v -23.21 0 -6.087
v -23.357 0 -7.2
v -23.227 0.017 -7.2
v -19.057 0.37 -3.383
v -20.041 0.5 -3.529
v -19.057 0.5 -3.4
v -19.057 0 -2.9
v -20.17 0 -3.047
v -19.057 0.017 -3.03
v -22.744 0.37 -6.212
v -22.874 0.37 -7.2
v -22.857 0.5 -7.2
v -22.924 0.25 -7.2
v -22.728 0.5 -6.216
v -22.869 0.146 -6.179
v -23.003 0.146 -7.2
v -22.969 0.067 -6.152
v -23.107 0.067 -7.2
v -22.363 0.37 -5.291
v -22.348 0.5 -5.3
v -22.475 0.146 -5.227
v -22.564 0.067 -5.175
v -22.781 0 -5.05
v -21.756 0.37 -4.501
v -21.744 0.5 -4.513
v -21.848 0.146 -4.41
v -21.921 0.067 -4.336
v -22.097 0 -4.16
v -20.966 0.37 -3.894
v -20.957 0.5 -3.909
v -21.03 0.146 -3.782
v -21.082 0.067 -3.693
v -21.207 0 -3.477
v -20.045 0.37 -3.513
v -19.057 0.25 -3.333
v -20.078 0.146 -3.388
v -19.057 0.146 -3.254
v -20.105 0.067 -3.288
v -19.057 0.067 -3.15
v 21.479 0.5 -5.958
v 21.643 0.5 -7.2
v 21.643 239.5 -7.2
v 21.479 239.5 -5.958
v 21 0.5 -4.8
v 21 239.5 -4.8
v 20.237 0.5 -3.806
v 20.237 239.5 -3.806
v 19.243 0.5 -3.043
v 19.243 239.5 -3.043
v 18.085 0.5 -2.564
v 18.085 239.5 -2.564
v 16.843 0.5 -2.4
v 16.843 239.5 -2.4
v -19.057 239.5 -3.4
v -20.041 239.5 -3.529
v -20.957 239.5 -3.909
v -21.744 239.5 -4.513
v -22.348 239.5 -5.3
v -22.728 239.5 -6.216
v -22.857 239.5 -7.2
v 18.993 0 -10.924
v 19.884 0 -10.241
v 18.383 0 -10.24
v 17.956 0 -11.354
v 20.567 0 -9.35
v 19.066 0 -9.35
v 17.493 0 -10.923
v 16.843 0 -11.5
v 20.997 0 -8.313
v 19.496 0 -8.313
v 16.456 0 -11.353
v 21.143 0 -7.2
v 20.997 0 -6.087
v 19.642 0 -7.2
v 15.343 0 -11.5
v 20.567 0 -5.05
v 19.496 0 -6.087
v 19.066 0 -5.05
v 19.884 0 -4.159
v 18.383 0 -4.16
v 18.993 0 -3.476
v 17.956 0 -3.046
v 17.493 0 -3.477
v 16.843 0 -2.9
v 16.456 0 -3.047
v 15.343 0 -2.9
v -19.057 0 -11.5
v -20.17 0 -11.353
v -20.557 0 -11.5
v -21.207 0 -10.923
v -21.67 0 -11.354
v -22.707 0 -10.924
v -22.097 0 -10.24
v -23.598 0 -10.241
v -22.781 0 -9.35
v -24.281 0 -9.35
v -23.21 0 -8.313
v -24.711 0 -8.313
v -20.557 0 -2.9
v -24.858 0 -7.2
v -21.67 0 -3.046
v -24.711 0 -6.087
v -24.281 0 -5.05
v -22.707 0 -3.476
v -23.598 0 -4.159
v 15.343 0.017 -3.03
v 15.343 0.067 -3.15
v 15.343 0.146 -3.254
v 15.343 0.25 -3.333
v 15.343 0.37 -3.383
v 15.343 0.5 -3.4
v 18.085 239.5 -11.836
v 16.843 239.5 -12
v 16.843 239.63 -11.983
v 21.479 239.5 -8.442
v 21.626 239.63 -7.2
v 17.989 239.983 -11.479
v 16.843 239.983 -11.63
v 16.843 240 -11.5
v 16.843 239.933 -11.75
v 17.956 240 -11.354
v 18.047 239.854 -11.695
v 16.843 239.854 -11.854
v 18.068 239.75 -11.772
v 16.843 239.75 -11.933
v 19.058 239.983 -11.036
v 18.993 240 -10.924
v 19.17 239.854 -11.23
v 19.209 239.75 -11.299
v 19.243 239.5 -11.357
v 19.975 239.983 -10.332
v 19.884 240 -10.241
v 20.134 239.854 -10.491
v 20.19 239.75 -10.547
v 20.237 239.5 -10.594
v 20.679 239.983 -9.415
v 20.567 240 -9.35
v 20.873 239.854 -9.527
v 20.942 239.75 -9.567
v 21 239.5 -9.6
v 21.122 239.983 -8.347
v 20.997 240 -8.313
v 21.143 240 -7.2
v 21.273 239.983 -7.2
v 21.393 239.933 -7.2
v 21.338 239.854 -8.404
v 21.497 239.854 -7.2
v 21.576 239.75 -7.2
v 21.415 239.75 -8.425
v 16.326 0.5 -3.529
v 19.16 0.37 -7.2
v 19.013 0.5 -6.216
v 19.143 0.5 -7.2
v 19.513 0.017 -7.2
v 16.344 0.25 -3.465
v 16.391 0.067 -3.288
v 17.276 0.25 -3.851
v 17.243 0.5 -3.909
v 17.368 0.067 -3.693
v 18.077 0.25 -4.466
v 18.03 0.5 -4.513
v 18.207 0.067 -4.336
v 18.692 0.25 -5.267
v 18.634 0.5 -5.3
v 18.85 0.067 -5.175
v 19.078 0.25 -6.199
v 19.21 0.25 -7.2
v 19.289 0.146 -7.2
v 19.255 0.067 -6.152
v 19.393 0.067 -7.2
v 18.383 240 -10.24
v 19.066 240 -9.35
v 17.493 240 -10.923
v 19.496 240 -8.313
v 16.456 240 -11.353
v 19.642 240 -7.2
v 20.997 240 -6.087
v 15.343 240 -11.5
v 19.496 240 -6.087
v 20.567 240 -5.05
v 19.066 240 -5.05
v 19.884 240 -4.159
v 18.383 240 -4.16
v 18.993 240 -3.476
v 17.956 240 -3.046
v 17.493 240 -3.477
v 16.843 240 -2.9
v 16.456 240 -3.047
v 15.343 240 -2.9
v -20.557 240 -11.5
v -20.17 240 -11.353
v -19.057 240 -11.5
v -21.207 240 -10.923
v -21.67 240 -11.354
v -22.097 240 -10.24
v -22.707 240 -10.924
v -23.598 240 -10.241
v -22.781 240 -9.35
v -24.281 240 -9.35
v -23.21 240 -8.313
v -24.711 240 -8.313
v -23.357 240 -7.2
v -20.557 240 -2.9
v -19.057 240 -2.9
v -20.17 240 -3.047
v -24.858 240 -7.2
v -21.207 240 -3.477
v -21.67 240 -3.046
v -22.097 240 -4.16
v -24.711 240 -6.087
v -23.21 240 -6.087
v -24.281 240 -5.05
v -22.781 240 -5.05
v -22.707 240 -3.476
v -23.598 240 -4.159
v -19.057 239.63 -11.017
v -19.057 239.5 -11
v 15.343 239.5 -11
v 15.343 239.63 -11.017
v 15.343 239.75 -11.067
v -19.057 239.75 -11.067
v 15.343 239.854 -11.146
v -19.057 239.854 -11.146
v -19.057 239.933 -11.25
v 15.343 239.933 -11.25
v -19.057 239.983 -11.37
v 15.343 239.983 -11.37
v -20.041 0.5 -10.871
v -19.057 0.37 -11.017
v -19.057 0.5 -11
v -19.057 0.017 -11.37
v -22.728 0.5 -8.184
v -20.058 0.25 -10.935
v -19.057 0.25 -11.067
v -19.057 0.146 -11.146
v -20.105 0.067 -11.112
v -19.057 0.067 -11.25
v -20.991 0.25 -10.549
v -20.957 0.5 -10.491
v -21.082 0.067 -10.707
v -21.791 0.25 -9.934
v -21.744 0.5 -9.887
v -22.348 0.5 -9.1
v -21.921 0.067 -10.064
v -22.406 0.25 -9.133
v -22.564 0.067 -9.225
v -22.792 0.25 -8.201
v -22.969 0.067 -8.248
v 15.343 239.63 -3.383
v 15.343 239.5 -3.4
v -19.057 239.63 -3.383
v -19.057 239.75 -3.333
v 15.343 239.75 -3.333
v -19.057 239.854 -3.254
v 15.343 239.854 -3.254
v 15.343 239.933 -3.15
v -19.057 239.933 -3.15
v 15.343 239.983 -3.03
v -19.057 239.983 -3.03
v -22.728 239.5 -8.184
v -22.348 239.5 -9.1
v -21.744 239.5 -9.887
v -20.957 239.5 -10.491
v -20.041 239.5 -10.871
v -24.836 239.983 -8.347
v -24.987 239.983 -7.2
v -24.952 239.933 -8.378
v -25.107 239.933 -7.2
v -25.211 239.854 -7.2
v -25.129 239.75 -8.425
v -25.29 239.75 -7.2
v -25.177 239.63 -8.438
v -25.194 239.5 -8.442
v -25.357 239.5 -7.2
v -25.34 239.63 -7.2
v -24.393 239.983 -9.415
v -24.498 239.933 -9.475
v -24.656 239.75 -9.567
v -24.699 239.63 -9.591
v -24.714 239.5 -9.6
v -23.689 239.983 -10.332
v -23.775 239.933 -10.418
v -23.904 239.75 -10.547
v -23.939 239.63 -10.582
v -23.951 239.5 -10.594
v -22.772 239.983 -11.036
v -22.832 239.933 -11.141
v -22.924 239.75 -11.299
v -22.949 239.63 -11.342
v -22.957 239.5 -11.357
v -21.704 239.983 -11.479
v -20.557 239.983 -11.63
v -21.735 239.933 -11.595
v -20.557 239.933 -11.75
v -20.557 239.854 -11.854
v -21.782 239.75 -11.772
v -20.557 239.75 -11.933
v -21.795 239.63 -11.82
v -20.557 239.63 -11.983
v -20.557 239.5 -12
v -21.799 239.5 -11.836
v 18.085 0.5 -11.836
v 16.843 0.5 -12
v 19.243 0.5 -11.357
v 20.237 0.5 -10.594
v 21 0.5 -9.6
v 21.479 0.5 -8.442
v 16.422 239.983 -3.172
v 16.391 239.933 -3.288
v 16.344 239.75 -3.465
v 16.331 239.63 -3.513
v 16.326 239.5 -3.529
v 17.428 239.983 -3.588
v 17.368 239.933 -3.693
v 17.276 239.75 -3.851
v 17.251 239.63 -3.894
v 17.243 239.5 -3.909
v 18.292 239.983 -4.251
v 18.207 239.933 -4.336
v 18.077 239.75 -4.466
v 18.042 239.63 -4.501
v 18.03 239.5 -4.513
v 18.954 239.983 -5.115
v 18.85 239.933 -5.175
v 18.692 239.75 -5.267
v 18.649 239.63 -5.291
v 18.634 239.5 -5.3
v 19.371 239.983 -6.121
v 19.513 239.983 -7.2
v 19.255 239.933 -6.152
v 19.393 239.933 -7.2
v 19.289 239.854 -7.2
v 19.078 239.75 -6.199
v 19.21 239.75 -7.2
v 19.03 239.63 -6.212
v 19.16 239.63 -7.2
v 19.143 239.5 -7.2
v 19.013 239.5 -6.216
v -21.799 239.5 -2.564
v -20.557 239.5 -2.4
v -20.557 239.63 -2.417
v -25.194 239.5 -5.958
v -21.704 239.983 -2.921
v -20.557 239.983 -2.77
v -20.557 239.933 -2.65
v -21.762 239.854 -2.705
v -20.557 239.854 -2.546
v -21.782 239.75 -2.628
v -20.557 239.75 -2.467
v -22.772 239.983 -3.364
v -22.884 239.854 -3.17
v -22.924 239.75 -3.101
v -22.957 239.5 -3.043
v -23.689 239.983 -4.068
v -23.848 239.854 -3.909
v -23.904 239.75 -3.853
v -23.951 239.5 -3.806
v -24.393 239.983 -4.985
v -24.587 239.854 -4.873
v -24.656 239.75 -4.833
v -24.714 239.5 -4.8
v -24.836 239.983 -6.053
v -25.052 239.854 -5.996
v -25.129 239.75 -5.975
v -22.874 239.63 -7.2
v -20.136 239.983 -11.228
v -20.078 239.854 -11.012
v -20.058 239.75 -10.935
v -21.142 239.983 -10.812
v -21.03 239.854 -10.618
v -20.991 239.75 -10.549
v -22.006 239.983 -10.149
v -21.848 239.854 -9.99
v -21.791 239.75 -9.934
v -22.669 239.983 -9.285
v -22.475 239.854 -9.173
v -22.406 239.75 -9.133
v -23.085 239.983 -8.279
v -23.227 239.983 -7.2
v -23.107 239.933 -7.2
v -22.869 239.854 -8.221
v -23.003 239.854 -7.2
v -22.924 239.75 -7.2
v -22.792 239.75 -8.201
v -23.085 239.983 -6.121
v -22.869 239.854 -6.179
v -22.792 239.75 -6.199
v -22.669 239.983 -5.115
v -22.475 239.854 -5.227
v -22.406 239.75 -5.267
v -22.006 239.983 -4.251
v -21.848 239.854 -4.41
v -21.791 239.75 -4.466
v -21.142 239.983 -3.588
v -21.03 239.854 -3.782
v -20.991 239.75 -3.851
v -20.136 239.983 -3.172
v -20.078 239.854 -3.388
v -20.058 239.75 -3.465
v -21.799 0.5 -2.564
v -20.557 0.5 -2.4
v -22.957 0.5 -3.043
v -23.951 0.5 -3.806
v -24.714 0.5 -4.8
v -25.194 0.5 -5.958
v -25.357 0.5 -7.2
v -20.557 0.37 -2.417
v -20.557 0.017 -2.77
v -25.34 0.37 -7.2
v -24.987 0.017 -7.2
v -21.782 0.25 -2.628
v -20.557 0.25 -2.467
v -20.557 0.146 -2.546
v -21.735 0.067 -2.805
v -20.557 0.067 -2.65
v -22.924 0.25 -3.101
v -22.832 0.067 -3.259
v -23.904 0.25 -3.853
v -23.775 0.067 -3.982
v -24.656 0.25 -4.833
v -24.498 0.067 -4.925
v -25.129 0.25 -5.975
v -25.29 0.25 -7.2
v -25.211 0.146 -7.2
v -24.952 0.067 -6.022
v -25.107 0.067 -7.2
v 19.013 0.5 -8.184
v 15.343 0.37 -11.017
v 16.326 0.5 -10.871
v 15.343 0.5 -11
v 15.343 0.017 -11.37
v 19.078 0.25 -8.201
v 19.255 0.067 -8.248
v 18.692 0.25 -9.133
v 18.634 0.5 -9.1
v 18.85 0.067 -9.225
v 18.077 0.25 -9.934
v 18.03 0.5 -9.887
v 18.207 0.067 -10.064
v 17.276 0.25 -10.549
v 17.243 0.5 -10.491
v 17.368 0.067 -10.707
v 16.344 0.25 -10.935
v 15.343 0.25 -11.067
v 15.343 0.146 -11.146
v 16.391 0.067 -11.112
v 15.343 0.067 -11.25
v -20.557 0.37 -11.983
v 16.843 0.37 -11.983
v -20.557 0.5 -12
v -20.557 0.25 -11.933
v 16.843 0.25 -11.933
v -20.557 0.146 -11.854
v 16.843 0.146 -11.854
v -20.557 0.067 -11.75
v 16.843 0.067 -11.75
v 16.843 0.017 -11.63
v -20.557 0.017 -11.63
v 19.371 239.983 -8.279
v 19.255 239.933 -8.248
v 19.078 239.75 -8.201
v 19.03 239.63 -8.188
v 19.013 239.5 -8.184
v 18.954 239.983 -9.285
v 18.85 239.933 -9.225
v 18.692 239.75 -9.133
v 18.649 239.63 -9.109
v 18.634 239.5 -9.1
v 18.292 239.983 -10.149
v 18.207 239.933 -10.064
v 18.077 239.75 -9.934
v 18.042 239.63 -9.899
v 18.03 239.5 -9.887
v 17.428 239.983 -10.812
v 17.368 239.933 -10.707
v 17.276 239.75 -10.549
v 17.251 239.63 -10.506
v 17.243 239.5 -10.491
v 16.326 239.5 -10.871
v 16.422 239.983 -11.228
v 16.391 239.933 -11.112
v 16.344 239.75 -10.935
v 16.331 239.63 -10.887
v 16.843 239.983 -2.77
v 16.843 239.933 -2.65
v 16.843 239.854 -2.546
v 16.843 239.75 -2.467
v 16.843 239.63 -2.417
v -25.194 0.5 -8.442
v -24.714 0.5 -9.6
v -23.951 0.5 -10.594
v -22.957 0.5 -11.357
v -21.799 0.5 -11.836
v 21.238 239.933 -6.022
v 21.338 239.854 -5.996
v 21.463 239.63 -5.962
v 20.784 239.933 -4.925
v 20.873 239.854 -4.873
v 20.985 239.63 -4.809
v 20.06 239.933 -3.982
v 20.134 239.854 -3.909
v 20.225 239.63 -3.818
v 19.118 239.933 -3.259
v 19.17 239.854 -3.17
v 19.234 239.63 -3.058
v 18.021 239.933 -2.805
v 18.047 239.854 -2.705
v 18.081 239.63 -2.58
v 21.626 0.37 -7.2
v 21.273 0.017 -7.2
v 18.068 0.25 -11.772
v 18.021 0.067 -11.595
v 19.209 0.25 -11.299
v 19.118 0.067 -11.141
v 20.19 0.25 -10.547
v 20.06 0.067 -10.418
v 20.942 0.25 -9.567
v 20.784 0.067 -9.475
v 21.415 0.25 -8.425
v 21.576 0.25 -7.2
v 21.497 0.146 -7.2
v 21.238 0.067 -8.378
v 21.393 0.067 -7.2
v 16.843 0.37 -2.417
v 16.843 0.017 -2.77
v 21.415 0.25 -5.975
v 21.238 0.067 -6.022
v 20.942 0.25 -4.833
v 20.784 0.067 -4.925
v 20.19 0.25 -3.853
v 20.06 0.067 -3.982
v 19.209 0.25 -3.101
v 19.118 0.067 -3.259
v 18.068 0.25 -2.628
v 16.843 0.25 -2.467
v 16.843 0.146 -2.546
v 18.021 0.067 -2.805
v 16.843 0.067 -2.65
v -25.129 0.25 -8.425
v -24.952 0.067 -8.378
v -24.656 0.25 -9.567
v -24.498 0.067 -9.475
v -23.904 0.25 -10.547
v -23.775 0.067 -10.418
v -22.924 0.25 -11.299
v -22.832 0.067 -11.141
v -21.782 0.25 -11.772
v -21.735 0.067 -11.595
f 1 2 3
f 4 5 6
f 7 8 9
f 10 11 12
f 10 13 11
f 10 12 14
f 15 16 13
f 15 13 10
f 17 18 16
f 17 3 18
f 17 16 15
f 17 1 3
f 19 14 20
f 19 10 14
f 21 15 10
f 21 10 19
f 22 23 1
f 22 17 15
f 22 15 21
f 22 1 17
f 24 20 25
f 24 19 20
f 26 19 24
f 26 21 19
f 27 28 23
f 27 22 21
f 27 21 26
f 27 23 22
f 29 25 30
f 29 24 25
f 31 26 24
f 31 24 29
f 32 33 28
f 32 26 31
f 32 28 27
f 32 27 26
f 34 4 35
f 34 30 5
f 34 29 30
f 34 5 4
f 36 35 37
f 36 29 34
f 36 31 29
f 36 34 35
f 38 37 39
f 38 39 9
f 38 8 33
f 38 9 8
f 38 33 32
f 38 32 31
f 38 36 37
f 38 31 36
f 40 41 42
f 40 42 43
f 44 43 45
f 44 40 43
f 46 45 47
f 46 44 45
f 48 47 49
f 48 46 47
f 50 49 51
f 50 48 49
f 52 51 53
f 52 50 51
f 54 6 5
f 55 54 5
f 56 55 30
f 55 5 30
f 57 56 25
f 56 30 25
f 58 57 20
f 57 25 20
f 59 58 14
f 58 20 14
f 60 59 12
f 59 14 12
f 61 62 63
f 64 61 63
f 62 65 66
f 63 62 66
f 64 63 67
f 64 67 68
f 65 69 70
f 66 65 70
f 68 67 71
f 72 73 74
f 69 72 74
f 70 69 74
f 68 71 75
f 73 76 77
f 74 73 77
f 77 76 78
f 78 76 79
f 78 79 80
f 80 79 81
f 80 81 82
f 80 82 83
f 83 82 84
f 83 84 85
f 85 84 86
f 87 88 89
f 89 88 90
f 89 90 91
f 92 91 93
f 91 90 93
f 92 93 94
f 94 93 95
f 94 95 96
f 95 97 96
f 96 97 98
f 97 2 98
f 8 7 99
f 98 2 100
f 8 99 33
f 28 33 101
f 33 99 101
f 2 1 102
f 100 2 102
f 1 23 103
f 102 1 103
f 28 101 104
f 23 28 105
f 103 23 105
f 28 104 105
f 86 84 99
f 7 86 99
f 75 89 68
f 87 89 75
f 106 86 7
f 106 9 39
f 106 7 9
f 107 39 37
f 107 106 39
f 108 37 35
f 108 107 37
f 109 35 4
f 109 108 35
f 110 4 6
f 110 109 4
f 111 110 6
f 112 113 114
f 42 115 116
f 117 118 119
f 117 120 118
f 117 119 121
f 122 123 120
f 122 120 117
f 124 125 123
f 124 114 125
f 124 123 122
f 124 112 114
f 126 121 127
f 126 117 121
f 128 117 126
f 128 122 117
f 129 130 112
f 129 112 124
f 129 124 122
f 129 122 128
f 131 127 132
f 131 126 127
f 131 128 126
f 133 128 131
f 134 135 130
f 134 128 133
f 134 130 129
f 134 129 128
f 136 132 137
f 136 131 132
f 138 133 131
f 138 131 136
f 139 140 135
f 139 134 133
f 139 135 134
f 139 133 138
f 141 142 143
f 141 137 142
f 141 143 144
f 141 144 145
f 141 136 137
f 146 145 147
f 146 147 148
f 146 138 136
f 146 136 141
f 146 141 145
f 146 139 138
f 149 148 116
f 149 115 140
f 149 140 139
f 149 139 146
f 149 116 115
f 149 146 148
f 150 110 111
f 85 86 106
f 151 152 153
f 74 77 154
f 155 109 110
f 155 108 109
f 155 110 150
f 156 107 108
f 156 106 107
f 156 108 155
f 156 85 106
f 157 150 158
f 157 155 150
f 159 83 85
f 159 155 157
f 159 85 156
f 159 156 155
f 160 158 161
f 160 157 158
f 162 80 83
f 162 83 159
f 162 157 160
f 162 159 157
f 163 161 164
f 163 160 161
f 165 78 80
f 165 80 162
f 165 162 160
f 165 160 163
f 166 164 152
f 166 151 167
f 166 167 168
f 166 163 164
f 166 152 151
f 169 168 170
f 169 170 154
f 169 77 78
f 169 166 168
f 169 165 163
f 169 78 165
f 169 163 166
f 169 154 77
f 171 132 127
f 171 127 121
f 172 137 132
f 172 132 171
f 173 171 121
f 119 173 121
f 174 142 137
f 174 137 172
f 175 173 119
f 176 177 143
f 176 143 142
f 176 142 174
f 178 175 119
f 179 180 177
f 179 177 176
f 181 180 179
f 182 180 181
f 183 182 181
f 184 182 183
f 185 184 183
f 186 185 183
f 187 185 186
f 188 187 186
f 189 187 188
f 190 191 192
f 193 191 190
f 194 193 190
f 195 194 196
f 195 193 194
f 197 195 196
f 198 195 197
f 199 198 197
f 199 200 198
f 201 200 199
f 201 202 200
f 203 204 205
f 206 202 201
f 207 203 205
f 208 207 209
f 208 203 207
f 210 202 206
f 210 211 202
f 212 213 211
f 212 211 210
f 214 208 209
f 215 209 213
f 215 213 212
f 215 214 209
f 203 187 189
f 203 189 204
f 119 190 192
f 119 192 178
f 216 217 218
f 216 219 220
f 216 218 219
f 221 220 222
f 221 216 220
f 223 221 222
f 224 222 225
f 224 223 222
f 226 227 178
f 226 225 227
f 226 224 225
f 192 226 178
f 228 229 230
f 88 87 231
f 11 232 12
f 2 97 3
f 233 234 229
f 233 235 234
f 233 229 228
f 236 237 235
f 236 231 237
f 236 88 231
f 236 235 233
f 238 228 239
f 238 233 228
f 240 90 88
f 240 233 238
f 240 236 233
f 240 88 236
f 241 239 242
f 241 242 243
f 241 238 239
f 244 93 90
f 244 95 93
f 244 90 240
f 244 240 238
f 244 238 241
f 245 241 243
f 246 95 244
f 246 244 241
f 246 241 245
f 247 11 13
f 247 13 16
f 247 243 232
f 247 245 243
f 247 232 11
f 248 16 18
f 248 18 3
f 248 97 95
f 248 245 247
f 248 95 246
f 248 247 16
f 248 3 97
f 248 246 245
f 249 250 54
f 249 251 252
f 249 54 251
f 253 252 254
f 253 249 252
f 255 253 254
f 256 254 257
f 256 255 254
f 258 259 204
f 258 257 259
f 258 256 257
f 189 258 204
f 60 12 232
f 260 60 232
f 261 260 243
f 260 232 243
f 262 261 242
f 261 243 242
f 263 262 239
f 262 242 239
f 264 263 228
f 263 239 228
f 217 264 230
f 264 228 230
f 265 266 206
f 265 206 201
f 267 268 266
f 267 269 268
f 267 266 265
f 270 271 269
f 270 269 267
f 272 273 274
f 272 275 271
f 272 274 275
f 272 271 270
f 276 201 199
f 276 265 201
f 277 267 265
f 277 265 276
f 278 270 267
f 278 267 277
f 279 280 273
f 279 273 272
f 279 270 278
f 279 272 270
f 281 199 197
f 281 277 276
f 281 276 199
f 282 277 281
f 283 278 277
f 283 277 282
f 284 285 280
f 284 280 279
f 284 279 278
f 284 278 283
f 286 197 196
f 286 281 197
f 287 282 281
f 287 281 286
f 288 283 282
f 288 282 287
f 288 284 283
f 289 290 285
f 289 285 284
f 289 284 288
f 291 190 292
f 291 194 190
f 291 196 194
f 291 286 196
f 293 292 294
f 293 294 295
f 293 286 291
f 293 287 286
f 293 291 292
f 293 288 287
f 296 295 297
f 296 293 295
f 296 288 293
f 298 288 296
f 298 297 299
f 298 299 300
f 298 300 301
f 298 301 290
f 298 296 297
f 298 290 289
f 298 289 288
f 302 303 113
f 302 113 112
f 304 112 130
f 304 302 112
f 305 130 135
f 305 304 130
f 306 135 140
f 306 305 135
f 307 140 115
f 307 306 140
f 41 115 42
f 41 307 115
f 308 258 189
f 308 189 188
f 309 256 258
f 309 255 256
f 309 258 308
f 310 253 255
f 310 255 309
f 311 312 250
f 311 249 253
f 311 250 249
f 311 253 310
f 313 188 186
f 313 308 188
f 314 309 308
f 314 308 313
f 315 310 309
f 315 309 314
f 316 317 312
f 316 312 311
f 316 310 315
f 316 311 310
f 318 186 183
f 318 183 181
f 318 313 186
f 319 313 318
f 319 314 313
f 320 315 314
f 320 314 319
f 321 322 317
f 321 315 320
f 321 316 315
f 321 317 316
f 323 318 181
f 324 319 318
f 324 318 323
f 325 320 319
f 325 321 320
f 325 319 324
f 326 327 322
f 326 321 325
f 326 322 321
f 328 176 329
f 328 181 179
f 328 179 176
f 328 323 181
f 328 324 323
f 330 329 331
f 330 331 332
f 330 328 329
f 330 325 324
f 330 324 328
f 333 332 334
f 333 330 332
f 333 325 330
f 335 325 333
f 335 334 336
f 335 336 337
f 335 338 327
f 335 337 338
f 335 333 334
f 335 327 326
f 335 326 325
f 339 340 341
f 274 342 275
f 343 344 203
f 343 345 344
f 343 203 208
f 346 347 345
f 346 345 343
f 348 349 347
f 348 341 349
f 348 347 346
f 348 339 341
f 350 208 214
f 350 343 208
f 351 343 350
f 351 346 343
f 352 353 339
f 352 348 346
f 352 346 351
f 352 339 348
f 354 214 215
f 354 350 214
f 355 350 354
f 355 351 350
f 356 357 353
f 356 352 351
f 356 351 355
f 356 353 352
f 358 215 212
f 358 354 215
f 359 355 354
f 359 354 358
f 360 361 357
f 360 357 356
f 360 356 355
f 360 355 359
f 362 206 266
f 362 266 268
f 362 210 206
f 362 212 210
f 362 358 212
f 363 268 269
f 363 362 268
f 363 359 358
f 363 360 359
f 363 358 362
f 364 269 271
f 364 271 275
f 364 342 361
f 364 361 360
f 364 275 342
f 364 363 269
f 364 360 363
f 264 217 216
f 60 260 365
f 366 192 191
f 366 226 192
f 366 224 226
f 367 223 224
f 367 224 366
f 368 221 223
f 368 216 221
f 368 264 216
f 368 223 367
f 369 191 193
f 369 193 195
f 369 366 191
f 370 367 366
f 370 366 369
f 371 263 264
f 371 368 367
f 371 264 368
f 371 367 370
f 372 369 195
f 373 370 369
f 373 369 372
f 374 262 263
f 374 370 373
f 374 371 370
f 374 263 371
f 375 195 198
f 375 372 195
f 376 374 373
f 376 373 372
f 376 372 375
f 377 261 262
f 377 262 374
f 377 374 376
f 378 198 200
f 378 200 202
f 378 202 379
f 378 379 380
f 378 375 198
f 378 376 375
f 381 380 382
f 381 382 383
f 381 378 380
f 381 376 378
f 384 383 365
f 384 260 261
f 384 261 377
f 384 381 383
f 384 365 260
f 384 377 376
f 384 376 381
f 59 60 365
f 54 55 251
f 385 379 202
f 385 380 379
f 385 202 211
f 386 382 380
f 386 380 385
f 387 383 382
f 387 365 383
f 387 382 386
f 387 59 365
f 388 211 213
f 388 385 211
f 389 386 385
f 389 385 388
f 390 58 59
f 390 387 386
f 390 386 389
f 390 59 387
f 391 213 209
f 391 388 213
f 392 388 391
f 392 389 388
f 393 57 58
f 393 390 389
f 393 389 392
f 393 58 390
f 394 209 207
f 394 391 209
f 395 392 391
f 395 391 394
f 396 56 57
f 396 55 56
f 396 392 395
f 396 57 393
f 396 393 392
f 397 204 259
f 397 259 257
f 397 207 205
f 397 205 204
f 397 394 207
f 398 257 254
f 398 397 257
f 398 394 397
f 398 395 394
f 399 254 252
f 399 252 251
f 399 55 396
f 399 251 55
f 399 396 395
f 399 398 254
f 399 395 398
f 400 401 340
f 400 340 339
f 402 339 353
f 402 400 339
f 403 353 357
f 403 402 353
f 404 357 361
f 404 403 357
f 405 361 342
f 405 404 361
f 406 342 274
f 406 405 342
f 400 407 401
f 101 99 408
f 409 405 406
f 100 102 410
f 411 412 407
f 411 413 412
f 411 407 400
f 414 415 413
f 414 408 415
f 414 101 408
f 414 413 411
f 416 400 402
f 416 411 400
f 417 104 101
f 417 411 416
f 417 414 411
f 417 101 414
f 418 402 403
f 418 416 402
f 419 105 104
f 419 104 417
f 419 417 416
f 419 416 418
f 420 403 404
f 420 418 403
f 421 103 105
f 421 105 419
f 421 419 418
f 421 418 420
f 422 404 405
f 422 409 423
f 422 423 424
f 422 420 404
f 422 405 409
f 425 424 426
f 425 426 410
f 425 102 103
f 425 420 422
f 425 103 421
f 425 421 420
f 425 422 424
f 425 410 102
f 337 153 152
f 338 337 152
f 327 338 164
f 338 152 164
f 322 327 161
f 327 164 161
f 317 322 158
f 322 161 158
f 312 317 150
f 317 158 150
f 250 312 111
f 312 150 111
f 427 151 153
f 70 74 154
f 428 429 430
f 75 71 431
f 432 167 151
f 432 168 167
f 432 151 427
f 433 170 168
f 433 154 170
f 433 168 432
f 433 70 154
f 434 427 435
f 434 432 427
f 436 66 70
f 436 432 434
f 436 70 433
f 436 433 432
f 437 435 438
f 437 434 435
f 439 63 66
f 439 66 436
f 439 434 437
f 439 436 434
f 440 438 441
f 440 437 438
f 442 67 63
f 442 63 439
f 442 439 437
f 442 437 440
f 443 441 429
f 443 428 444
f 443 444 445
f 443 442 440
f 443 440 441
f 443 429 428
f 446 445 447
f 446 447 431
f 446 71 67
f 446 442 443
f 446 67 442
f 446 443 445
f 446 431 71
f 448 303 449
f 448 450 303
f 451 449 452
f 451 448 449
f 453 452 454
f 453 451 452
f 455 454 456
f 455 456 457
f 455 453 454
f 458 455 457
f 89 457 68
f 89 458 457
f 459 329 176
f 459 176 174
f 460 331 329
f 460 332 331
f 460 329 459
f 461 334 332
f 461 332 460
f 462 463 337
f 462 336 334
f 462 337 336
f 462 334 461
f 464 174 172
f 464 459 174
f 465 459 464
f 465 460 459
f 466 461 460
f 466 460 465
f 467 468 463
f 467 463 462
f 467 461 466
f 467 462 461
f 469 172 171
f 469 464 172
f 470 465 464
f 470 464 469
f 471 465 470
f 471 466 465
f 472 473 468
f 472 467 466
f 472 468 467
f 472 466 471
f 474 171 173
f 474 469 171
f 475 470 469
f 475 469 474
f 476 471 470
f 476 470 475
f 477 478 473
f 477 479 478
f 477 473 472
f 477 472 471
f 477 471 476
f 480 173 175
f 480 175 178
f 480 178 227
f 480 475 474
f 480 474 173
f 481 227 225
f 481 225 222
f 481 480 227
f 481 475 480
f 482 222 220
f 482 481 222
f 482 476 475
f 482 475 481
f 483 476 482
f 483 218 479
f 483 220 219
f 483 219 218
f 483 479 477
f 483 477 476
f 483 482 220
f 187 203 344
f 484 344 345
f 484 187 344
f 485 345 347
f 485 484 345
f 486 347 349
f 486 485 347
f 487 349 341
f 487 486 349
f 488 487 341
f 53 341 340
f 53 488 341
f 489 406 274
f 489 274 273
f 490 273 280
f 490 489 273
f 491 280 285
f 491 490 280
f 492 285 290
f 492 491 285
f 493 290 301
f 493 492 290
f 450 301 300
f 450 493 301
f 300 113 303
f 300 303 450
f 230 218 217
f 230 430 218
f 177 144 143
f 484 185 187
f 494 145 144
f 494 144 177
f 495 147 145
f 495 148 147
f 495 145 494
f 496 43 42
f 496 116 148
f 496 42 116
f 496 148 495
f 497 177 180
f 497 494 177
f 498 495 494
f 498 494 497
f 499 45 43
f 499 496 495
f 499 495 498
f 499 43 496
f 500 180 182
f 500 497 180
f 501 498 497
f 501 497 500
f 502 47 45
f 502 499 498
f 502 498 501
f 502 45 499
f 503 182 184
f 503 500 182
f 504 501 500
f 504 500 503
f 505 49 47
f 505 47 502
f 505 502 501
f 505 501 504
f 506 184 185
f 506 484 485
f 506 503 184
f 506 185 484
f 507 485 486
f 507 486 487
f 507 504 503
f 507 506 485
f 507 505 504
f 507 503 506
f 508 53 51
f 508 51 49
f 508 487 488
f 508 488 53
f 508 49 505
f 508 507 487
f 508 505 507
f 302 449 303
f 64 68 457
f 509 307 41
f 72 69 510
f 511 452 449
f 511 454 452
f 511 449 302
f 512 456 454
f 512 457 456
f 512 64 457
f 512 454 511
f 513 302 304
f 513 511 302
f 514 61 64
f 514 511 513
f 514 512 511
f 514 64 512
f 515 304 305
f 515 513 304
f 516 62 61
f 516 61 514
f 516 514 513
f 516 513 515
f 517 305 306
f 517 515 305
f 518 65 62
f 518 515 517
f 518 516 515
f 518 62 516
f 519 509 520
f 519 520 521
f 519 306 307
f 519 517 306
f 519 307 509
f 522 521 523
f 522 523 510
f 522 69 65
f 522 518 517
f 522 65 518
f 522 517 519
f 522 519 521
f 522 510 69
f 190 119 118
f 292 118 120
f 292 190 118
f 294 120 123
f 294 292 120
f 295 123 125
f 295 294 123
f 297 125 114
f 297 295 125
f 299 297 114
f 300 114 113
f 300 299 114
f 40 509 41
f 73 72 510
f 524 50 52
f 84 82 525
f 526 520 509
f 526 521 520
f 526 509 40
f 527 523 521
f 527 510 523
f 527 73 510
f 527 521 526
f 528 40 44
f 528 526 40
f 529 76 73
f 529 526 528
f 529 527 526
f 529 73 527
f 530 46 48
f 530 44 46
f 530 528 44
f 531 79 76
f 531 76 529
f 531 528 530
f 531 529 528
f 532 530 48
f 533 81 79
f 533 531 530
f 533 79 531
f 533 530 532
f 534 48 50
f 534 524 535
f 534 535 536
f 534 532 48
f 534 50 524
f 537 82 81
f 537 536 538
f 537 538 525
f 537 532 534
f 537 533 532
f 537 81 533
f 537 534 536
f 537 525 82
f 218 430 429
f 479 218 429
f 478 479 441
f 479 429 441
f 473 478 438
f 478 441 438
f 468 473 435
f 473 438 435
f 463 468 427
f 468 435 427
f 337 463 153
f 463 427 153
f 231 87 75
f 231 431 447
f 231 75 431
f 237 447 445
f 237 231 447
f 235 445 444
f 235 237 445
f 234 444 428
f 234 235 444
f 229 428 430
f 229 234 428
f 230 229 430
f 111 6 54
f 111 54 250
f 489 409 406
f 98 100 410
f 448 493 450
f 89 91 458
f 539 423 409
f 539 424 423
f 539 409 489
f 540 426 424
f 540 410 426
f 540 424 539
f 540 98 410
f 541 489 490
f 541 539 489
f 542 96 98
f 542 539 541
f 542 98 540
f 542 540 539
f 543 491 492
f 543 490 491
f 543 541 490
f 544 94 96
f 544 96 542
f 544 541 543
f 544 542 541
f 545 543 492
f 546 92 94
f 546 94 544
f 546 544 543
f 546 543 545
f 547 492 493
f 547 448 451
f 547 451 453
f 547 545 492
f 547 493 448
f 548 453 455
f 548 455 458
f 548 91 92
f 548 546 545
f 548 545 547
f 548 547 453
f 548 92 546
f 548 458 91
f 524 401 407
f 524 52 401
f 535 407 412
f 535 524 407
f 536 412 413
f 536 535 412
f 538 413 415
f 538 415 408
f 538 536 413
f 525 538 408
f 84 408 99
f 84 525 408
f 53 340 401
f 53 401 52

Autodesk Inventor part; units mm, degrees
ref_plane "YZ Plane" through (0, 0, 0) normal (1, 0, 0) x (0, 1, 0)
ref_plane "XZ Plane" through (0, 0, 0) normal (0, 1, 0) x (-1, 0, 0)
sketch "Эскиз1" plane through (0, 0, 0) normal (0, 1, 0) x (-1, 0, 0)
  line L0 (20.5571, -2.4) -> (-16.8429, -2.4)
  line L1 (-21.6429, -7.2) -> (-21.6429, -7.2)
  line L2 (-16.8429, -12) -> (20.5571, -12)
  line L3 (25.3571, -7.2) -> (25.3571, -7.2)
  arc A0 (25.3571, -7.2) -> (20.5571, -2.4) centre (20.5571, -7.2) ccw
  arc A1 (20.5571, -12) -> (25.3571, -7.2) centre (20.5571, -7.2) ccw
  arc A2 (-16.8429, -2.4) -> (-21.6429, -7.2) centre (-16.8429, -7.2) ccw
  arc A3 (-21.6429, -7.2) -> (-16.8429, -12) centre (-16.8429, -7.2) ccw
  line L4 (19.0571, -3.4) -> (-15.3429, -3.4)
  line L5 (-19.1429, -7.2) -> (-19.1429, -7.2)
  line L6 (-15.3429, -11) -> (19.0571, -11)
  line L7 (22.8571, -7.2) -> (22.8571, -7.2)
  arc A4 (22.8571, -7.2) -> (19.0571, -3.4) centre (19.0571, -7.2) ccw
  arc A5 (19.0571, -11) -> (22.8571, -7.2) centre (19.0571, -7.2) ccw
  arc A6 (-19.1429, -7.2) -> (-15.3429, -11) centre (-15.3429, -7.2) ccw
  arc A7 (-15.3429, -3.4) -> (-19.1429, -7.2) centre (-15.3429, -7.2) ccw
  point P0 (0, 0)
  point P1 (25.3571, -2.4)
  point P2 (-21.6429, -2.4)
  dimension "d0" = 47
  dimension "d1" = 9.6
  dimension "d2" = 4.8
  dimension "d3" = 1
  dimension "d4" = 1
  dimension "d5" = 2.5
  dimension "d6" = 2.5
  dimension "d7" = 3.8
extrude "Выдавливание1" add sketch "Эскиз1" along normal blind 240
ref_plane "РабПлоскость1" through (0, 250, 0) normal (0, 1, 0) x (1, 0, 0)
fillet "Сопряжение1" radius 0.5 8 edges at (18.0299, 0, -9.887) (-1.8571, 0, -11) (-21.7441, 0, -9.887) (-1.8571, 0, -3.4) (-23.9513, 0, -3.8059) (-1.8571, 0, -12) (20.237, 0, -3.8059) (-1.8571, 0, -2.4)
fillet "Сопряжение2" radius 0.5 8 edges at (20.237, 240, -10.5941) (-1.8571, 240, -12) (-23.9513, 240, -3.8059) (-1.8571, 240, -2.4) (-21.7441, 240, -9.887) (-1.8571, 240, -11) (18.0299, 240, -9.887) (-1.8571, 240, -3.4)
sketch3d "3D эскиз1"
ref_plane "РабПлоскость9" through (-10.4571, 0, -2.9) normal (0, -1, 0) x (1, 0, 0)
ref_plane "РабПлоскость10" through (-24.8571, 240, -7.2) normal (0, 1, 0) x (1, 0, 0)
properties part number "isolator_A"
